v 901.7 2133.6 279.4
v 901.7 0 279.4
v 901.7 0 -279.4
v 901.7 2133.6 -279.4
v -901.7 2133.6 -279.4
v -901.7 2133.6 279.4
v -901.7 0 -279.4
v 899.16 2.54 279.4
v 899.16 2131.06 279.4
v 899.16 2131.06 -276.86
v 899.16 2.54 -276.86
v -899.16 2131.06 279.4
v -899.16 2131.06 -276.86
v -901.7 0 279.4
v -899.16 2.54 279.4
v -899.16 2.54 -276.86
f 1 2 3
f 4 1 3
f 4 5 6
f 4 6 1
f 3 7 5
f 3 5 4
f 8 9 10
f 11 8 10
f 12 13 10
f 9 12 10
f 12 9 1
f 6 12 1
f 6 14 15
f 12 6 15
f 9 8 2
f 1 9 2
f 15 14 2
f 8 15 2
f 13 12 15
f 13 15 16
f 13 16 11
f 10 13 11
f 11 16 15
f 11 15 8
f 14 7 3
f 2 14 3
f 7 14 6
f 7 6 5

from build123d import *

# Parameters (mm, degrees)
SKETCH1_W           = 1803.4
SKETCH1_H           = 558.8
BOSS_EXTRUDE1_DEPTH = 2133.6
SHELL1_T            = -2.54


with BuildPart() as part:
    # Sketch1 → Boss-Extrude1 (new body)
    with BuildSketch(Plane(origin=(0, 0, 0), x_dir=(1, 0, 0), z_dir=(0, 1, 0))):
        Rectangle(SKETCH1_W, SKETCH1_H)
    extrude(amount=BOSS_EXTRUDE1_DEPTH)

    # Shell1
    shell1_openings = [part.faces().sort_by_distance(p)[0] for p in [
        (0, 1066.8, 279.4),
    ]]
    offset(amount=SHELL1_T, openings=shell1_openings, kind=Kind.INTERSECTION)


solid = part.part
